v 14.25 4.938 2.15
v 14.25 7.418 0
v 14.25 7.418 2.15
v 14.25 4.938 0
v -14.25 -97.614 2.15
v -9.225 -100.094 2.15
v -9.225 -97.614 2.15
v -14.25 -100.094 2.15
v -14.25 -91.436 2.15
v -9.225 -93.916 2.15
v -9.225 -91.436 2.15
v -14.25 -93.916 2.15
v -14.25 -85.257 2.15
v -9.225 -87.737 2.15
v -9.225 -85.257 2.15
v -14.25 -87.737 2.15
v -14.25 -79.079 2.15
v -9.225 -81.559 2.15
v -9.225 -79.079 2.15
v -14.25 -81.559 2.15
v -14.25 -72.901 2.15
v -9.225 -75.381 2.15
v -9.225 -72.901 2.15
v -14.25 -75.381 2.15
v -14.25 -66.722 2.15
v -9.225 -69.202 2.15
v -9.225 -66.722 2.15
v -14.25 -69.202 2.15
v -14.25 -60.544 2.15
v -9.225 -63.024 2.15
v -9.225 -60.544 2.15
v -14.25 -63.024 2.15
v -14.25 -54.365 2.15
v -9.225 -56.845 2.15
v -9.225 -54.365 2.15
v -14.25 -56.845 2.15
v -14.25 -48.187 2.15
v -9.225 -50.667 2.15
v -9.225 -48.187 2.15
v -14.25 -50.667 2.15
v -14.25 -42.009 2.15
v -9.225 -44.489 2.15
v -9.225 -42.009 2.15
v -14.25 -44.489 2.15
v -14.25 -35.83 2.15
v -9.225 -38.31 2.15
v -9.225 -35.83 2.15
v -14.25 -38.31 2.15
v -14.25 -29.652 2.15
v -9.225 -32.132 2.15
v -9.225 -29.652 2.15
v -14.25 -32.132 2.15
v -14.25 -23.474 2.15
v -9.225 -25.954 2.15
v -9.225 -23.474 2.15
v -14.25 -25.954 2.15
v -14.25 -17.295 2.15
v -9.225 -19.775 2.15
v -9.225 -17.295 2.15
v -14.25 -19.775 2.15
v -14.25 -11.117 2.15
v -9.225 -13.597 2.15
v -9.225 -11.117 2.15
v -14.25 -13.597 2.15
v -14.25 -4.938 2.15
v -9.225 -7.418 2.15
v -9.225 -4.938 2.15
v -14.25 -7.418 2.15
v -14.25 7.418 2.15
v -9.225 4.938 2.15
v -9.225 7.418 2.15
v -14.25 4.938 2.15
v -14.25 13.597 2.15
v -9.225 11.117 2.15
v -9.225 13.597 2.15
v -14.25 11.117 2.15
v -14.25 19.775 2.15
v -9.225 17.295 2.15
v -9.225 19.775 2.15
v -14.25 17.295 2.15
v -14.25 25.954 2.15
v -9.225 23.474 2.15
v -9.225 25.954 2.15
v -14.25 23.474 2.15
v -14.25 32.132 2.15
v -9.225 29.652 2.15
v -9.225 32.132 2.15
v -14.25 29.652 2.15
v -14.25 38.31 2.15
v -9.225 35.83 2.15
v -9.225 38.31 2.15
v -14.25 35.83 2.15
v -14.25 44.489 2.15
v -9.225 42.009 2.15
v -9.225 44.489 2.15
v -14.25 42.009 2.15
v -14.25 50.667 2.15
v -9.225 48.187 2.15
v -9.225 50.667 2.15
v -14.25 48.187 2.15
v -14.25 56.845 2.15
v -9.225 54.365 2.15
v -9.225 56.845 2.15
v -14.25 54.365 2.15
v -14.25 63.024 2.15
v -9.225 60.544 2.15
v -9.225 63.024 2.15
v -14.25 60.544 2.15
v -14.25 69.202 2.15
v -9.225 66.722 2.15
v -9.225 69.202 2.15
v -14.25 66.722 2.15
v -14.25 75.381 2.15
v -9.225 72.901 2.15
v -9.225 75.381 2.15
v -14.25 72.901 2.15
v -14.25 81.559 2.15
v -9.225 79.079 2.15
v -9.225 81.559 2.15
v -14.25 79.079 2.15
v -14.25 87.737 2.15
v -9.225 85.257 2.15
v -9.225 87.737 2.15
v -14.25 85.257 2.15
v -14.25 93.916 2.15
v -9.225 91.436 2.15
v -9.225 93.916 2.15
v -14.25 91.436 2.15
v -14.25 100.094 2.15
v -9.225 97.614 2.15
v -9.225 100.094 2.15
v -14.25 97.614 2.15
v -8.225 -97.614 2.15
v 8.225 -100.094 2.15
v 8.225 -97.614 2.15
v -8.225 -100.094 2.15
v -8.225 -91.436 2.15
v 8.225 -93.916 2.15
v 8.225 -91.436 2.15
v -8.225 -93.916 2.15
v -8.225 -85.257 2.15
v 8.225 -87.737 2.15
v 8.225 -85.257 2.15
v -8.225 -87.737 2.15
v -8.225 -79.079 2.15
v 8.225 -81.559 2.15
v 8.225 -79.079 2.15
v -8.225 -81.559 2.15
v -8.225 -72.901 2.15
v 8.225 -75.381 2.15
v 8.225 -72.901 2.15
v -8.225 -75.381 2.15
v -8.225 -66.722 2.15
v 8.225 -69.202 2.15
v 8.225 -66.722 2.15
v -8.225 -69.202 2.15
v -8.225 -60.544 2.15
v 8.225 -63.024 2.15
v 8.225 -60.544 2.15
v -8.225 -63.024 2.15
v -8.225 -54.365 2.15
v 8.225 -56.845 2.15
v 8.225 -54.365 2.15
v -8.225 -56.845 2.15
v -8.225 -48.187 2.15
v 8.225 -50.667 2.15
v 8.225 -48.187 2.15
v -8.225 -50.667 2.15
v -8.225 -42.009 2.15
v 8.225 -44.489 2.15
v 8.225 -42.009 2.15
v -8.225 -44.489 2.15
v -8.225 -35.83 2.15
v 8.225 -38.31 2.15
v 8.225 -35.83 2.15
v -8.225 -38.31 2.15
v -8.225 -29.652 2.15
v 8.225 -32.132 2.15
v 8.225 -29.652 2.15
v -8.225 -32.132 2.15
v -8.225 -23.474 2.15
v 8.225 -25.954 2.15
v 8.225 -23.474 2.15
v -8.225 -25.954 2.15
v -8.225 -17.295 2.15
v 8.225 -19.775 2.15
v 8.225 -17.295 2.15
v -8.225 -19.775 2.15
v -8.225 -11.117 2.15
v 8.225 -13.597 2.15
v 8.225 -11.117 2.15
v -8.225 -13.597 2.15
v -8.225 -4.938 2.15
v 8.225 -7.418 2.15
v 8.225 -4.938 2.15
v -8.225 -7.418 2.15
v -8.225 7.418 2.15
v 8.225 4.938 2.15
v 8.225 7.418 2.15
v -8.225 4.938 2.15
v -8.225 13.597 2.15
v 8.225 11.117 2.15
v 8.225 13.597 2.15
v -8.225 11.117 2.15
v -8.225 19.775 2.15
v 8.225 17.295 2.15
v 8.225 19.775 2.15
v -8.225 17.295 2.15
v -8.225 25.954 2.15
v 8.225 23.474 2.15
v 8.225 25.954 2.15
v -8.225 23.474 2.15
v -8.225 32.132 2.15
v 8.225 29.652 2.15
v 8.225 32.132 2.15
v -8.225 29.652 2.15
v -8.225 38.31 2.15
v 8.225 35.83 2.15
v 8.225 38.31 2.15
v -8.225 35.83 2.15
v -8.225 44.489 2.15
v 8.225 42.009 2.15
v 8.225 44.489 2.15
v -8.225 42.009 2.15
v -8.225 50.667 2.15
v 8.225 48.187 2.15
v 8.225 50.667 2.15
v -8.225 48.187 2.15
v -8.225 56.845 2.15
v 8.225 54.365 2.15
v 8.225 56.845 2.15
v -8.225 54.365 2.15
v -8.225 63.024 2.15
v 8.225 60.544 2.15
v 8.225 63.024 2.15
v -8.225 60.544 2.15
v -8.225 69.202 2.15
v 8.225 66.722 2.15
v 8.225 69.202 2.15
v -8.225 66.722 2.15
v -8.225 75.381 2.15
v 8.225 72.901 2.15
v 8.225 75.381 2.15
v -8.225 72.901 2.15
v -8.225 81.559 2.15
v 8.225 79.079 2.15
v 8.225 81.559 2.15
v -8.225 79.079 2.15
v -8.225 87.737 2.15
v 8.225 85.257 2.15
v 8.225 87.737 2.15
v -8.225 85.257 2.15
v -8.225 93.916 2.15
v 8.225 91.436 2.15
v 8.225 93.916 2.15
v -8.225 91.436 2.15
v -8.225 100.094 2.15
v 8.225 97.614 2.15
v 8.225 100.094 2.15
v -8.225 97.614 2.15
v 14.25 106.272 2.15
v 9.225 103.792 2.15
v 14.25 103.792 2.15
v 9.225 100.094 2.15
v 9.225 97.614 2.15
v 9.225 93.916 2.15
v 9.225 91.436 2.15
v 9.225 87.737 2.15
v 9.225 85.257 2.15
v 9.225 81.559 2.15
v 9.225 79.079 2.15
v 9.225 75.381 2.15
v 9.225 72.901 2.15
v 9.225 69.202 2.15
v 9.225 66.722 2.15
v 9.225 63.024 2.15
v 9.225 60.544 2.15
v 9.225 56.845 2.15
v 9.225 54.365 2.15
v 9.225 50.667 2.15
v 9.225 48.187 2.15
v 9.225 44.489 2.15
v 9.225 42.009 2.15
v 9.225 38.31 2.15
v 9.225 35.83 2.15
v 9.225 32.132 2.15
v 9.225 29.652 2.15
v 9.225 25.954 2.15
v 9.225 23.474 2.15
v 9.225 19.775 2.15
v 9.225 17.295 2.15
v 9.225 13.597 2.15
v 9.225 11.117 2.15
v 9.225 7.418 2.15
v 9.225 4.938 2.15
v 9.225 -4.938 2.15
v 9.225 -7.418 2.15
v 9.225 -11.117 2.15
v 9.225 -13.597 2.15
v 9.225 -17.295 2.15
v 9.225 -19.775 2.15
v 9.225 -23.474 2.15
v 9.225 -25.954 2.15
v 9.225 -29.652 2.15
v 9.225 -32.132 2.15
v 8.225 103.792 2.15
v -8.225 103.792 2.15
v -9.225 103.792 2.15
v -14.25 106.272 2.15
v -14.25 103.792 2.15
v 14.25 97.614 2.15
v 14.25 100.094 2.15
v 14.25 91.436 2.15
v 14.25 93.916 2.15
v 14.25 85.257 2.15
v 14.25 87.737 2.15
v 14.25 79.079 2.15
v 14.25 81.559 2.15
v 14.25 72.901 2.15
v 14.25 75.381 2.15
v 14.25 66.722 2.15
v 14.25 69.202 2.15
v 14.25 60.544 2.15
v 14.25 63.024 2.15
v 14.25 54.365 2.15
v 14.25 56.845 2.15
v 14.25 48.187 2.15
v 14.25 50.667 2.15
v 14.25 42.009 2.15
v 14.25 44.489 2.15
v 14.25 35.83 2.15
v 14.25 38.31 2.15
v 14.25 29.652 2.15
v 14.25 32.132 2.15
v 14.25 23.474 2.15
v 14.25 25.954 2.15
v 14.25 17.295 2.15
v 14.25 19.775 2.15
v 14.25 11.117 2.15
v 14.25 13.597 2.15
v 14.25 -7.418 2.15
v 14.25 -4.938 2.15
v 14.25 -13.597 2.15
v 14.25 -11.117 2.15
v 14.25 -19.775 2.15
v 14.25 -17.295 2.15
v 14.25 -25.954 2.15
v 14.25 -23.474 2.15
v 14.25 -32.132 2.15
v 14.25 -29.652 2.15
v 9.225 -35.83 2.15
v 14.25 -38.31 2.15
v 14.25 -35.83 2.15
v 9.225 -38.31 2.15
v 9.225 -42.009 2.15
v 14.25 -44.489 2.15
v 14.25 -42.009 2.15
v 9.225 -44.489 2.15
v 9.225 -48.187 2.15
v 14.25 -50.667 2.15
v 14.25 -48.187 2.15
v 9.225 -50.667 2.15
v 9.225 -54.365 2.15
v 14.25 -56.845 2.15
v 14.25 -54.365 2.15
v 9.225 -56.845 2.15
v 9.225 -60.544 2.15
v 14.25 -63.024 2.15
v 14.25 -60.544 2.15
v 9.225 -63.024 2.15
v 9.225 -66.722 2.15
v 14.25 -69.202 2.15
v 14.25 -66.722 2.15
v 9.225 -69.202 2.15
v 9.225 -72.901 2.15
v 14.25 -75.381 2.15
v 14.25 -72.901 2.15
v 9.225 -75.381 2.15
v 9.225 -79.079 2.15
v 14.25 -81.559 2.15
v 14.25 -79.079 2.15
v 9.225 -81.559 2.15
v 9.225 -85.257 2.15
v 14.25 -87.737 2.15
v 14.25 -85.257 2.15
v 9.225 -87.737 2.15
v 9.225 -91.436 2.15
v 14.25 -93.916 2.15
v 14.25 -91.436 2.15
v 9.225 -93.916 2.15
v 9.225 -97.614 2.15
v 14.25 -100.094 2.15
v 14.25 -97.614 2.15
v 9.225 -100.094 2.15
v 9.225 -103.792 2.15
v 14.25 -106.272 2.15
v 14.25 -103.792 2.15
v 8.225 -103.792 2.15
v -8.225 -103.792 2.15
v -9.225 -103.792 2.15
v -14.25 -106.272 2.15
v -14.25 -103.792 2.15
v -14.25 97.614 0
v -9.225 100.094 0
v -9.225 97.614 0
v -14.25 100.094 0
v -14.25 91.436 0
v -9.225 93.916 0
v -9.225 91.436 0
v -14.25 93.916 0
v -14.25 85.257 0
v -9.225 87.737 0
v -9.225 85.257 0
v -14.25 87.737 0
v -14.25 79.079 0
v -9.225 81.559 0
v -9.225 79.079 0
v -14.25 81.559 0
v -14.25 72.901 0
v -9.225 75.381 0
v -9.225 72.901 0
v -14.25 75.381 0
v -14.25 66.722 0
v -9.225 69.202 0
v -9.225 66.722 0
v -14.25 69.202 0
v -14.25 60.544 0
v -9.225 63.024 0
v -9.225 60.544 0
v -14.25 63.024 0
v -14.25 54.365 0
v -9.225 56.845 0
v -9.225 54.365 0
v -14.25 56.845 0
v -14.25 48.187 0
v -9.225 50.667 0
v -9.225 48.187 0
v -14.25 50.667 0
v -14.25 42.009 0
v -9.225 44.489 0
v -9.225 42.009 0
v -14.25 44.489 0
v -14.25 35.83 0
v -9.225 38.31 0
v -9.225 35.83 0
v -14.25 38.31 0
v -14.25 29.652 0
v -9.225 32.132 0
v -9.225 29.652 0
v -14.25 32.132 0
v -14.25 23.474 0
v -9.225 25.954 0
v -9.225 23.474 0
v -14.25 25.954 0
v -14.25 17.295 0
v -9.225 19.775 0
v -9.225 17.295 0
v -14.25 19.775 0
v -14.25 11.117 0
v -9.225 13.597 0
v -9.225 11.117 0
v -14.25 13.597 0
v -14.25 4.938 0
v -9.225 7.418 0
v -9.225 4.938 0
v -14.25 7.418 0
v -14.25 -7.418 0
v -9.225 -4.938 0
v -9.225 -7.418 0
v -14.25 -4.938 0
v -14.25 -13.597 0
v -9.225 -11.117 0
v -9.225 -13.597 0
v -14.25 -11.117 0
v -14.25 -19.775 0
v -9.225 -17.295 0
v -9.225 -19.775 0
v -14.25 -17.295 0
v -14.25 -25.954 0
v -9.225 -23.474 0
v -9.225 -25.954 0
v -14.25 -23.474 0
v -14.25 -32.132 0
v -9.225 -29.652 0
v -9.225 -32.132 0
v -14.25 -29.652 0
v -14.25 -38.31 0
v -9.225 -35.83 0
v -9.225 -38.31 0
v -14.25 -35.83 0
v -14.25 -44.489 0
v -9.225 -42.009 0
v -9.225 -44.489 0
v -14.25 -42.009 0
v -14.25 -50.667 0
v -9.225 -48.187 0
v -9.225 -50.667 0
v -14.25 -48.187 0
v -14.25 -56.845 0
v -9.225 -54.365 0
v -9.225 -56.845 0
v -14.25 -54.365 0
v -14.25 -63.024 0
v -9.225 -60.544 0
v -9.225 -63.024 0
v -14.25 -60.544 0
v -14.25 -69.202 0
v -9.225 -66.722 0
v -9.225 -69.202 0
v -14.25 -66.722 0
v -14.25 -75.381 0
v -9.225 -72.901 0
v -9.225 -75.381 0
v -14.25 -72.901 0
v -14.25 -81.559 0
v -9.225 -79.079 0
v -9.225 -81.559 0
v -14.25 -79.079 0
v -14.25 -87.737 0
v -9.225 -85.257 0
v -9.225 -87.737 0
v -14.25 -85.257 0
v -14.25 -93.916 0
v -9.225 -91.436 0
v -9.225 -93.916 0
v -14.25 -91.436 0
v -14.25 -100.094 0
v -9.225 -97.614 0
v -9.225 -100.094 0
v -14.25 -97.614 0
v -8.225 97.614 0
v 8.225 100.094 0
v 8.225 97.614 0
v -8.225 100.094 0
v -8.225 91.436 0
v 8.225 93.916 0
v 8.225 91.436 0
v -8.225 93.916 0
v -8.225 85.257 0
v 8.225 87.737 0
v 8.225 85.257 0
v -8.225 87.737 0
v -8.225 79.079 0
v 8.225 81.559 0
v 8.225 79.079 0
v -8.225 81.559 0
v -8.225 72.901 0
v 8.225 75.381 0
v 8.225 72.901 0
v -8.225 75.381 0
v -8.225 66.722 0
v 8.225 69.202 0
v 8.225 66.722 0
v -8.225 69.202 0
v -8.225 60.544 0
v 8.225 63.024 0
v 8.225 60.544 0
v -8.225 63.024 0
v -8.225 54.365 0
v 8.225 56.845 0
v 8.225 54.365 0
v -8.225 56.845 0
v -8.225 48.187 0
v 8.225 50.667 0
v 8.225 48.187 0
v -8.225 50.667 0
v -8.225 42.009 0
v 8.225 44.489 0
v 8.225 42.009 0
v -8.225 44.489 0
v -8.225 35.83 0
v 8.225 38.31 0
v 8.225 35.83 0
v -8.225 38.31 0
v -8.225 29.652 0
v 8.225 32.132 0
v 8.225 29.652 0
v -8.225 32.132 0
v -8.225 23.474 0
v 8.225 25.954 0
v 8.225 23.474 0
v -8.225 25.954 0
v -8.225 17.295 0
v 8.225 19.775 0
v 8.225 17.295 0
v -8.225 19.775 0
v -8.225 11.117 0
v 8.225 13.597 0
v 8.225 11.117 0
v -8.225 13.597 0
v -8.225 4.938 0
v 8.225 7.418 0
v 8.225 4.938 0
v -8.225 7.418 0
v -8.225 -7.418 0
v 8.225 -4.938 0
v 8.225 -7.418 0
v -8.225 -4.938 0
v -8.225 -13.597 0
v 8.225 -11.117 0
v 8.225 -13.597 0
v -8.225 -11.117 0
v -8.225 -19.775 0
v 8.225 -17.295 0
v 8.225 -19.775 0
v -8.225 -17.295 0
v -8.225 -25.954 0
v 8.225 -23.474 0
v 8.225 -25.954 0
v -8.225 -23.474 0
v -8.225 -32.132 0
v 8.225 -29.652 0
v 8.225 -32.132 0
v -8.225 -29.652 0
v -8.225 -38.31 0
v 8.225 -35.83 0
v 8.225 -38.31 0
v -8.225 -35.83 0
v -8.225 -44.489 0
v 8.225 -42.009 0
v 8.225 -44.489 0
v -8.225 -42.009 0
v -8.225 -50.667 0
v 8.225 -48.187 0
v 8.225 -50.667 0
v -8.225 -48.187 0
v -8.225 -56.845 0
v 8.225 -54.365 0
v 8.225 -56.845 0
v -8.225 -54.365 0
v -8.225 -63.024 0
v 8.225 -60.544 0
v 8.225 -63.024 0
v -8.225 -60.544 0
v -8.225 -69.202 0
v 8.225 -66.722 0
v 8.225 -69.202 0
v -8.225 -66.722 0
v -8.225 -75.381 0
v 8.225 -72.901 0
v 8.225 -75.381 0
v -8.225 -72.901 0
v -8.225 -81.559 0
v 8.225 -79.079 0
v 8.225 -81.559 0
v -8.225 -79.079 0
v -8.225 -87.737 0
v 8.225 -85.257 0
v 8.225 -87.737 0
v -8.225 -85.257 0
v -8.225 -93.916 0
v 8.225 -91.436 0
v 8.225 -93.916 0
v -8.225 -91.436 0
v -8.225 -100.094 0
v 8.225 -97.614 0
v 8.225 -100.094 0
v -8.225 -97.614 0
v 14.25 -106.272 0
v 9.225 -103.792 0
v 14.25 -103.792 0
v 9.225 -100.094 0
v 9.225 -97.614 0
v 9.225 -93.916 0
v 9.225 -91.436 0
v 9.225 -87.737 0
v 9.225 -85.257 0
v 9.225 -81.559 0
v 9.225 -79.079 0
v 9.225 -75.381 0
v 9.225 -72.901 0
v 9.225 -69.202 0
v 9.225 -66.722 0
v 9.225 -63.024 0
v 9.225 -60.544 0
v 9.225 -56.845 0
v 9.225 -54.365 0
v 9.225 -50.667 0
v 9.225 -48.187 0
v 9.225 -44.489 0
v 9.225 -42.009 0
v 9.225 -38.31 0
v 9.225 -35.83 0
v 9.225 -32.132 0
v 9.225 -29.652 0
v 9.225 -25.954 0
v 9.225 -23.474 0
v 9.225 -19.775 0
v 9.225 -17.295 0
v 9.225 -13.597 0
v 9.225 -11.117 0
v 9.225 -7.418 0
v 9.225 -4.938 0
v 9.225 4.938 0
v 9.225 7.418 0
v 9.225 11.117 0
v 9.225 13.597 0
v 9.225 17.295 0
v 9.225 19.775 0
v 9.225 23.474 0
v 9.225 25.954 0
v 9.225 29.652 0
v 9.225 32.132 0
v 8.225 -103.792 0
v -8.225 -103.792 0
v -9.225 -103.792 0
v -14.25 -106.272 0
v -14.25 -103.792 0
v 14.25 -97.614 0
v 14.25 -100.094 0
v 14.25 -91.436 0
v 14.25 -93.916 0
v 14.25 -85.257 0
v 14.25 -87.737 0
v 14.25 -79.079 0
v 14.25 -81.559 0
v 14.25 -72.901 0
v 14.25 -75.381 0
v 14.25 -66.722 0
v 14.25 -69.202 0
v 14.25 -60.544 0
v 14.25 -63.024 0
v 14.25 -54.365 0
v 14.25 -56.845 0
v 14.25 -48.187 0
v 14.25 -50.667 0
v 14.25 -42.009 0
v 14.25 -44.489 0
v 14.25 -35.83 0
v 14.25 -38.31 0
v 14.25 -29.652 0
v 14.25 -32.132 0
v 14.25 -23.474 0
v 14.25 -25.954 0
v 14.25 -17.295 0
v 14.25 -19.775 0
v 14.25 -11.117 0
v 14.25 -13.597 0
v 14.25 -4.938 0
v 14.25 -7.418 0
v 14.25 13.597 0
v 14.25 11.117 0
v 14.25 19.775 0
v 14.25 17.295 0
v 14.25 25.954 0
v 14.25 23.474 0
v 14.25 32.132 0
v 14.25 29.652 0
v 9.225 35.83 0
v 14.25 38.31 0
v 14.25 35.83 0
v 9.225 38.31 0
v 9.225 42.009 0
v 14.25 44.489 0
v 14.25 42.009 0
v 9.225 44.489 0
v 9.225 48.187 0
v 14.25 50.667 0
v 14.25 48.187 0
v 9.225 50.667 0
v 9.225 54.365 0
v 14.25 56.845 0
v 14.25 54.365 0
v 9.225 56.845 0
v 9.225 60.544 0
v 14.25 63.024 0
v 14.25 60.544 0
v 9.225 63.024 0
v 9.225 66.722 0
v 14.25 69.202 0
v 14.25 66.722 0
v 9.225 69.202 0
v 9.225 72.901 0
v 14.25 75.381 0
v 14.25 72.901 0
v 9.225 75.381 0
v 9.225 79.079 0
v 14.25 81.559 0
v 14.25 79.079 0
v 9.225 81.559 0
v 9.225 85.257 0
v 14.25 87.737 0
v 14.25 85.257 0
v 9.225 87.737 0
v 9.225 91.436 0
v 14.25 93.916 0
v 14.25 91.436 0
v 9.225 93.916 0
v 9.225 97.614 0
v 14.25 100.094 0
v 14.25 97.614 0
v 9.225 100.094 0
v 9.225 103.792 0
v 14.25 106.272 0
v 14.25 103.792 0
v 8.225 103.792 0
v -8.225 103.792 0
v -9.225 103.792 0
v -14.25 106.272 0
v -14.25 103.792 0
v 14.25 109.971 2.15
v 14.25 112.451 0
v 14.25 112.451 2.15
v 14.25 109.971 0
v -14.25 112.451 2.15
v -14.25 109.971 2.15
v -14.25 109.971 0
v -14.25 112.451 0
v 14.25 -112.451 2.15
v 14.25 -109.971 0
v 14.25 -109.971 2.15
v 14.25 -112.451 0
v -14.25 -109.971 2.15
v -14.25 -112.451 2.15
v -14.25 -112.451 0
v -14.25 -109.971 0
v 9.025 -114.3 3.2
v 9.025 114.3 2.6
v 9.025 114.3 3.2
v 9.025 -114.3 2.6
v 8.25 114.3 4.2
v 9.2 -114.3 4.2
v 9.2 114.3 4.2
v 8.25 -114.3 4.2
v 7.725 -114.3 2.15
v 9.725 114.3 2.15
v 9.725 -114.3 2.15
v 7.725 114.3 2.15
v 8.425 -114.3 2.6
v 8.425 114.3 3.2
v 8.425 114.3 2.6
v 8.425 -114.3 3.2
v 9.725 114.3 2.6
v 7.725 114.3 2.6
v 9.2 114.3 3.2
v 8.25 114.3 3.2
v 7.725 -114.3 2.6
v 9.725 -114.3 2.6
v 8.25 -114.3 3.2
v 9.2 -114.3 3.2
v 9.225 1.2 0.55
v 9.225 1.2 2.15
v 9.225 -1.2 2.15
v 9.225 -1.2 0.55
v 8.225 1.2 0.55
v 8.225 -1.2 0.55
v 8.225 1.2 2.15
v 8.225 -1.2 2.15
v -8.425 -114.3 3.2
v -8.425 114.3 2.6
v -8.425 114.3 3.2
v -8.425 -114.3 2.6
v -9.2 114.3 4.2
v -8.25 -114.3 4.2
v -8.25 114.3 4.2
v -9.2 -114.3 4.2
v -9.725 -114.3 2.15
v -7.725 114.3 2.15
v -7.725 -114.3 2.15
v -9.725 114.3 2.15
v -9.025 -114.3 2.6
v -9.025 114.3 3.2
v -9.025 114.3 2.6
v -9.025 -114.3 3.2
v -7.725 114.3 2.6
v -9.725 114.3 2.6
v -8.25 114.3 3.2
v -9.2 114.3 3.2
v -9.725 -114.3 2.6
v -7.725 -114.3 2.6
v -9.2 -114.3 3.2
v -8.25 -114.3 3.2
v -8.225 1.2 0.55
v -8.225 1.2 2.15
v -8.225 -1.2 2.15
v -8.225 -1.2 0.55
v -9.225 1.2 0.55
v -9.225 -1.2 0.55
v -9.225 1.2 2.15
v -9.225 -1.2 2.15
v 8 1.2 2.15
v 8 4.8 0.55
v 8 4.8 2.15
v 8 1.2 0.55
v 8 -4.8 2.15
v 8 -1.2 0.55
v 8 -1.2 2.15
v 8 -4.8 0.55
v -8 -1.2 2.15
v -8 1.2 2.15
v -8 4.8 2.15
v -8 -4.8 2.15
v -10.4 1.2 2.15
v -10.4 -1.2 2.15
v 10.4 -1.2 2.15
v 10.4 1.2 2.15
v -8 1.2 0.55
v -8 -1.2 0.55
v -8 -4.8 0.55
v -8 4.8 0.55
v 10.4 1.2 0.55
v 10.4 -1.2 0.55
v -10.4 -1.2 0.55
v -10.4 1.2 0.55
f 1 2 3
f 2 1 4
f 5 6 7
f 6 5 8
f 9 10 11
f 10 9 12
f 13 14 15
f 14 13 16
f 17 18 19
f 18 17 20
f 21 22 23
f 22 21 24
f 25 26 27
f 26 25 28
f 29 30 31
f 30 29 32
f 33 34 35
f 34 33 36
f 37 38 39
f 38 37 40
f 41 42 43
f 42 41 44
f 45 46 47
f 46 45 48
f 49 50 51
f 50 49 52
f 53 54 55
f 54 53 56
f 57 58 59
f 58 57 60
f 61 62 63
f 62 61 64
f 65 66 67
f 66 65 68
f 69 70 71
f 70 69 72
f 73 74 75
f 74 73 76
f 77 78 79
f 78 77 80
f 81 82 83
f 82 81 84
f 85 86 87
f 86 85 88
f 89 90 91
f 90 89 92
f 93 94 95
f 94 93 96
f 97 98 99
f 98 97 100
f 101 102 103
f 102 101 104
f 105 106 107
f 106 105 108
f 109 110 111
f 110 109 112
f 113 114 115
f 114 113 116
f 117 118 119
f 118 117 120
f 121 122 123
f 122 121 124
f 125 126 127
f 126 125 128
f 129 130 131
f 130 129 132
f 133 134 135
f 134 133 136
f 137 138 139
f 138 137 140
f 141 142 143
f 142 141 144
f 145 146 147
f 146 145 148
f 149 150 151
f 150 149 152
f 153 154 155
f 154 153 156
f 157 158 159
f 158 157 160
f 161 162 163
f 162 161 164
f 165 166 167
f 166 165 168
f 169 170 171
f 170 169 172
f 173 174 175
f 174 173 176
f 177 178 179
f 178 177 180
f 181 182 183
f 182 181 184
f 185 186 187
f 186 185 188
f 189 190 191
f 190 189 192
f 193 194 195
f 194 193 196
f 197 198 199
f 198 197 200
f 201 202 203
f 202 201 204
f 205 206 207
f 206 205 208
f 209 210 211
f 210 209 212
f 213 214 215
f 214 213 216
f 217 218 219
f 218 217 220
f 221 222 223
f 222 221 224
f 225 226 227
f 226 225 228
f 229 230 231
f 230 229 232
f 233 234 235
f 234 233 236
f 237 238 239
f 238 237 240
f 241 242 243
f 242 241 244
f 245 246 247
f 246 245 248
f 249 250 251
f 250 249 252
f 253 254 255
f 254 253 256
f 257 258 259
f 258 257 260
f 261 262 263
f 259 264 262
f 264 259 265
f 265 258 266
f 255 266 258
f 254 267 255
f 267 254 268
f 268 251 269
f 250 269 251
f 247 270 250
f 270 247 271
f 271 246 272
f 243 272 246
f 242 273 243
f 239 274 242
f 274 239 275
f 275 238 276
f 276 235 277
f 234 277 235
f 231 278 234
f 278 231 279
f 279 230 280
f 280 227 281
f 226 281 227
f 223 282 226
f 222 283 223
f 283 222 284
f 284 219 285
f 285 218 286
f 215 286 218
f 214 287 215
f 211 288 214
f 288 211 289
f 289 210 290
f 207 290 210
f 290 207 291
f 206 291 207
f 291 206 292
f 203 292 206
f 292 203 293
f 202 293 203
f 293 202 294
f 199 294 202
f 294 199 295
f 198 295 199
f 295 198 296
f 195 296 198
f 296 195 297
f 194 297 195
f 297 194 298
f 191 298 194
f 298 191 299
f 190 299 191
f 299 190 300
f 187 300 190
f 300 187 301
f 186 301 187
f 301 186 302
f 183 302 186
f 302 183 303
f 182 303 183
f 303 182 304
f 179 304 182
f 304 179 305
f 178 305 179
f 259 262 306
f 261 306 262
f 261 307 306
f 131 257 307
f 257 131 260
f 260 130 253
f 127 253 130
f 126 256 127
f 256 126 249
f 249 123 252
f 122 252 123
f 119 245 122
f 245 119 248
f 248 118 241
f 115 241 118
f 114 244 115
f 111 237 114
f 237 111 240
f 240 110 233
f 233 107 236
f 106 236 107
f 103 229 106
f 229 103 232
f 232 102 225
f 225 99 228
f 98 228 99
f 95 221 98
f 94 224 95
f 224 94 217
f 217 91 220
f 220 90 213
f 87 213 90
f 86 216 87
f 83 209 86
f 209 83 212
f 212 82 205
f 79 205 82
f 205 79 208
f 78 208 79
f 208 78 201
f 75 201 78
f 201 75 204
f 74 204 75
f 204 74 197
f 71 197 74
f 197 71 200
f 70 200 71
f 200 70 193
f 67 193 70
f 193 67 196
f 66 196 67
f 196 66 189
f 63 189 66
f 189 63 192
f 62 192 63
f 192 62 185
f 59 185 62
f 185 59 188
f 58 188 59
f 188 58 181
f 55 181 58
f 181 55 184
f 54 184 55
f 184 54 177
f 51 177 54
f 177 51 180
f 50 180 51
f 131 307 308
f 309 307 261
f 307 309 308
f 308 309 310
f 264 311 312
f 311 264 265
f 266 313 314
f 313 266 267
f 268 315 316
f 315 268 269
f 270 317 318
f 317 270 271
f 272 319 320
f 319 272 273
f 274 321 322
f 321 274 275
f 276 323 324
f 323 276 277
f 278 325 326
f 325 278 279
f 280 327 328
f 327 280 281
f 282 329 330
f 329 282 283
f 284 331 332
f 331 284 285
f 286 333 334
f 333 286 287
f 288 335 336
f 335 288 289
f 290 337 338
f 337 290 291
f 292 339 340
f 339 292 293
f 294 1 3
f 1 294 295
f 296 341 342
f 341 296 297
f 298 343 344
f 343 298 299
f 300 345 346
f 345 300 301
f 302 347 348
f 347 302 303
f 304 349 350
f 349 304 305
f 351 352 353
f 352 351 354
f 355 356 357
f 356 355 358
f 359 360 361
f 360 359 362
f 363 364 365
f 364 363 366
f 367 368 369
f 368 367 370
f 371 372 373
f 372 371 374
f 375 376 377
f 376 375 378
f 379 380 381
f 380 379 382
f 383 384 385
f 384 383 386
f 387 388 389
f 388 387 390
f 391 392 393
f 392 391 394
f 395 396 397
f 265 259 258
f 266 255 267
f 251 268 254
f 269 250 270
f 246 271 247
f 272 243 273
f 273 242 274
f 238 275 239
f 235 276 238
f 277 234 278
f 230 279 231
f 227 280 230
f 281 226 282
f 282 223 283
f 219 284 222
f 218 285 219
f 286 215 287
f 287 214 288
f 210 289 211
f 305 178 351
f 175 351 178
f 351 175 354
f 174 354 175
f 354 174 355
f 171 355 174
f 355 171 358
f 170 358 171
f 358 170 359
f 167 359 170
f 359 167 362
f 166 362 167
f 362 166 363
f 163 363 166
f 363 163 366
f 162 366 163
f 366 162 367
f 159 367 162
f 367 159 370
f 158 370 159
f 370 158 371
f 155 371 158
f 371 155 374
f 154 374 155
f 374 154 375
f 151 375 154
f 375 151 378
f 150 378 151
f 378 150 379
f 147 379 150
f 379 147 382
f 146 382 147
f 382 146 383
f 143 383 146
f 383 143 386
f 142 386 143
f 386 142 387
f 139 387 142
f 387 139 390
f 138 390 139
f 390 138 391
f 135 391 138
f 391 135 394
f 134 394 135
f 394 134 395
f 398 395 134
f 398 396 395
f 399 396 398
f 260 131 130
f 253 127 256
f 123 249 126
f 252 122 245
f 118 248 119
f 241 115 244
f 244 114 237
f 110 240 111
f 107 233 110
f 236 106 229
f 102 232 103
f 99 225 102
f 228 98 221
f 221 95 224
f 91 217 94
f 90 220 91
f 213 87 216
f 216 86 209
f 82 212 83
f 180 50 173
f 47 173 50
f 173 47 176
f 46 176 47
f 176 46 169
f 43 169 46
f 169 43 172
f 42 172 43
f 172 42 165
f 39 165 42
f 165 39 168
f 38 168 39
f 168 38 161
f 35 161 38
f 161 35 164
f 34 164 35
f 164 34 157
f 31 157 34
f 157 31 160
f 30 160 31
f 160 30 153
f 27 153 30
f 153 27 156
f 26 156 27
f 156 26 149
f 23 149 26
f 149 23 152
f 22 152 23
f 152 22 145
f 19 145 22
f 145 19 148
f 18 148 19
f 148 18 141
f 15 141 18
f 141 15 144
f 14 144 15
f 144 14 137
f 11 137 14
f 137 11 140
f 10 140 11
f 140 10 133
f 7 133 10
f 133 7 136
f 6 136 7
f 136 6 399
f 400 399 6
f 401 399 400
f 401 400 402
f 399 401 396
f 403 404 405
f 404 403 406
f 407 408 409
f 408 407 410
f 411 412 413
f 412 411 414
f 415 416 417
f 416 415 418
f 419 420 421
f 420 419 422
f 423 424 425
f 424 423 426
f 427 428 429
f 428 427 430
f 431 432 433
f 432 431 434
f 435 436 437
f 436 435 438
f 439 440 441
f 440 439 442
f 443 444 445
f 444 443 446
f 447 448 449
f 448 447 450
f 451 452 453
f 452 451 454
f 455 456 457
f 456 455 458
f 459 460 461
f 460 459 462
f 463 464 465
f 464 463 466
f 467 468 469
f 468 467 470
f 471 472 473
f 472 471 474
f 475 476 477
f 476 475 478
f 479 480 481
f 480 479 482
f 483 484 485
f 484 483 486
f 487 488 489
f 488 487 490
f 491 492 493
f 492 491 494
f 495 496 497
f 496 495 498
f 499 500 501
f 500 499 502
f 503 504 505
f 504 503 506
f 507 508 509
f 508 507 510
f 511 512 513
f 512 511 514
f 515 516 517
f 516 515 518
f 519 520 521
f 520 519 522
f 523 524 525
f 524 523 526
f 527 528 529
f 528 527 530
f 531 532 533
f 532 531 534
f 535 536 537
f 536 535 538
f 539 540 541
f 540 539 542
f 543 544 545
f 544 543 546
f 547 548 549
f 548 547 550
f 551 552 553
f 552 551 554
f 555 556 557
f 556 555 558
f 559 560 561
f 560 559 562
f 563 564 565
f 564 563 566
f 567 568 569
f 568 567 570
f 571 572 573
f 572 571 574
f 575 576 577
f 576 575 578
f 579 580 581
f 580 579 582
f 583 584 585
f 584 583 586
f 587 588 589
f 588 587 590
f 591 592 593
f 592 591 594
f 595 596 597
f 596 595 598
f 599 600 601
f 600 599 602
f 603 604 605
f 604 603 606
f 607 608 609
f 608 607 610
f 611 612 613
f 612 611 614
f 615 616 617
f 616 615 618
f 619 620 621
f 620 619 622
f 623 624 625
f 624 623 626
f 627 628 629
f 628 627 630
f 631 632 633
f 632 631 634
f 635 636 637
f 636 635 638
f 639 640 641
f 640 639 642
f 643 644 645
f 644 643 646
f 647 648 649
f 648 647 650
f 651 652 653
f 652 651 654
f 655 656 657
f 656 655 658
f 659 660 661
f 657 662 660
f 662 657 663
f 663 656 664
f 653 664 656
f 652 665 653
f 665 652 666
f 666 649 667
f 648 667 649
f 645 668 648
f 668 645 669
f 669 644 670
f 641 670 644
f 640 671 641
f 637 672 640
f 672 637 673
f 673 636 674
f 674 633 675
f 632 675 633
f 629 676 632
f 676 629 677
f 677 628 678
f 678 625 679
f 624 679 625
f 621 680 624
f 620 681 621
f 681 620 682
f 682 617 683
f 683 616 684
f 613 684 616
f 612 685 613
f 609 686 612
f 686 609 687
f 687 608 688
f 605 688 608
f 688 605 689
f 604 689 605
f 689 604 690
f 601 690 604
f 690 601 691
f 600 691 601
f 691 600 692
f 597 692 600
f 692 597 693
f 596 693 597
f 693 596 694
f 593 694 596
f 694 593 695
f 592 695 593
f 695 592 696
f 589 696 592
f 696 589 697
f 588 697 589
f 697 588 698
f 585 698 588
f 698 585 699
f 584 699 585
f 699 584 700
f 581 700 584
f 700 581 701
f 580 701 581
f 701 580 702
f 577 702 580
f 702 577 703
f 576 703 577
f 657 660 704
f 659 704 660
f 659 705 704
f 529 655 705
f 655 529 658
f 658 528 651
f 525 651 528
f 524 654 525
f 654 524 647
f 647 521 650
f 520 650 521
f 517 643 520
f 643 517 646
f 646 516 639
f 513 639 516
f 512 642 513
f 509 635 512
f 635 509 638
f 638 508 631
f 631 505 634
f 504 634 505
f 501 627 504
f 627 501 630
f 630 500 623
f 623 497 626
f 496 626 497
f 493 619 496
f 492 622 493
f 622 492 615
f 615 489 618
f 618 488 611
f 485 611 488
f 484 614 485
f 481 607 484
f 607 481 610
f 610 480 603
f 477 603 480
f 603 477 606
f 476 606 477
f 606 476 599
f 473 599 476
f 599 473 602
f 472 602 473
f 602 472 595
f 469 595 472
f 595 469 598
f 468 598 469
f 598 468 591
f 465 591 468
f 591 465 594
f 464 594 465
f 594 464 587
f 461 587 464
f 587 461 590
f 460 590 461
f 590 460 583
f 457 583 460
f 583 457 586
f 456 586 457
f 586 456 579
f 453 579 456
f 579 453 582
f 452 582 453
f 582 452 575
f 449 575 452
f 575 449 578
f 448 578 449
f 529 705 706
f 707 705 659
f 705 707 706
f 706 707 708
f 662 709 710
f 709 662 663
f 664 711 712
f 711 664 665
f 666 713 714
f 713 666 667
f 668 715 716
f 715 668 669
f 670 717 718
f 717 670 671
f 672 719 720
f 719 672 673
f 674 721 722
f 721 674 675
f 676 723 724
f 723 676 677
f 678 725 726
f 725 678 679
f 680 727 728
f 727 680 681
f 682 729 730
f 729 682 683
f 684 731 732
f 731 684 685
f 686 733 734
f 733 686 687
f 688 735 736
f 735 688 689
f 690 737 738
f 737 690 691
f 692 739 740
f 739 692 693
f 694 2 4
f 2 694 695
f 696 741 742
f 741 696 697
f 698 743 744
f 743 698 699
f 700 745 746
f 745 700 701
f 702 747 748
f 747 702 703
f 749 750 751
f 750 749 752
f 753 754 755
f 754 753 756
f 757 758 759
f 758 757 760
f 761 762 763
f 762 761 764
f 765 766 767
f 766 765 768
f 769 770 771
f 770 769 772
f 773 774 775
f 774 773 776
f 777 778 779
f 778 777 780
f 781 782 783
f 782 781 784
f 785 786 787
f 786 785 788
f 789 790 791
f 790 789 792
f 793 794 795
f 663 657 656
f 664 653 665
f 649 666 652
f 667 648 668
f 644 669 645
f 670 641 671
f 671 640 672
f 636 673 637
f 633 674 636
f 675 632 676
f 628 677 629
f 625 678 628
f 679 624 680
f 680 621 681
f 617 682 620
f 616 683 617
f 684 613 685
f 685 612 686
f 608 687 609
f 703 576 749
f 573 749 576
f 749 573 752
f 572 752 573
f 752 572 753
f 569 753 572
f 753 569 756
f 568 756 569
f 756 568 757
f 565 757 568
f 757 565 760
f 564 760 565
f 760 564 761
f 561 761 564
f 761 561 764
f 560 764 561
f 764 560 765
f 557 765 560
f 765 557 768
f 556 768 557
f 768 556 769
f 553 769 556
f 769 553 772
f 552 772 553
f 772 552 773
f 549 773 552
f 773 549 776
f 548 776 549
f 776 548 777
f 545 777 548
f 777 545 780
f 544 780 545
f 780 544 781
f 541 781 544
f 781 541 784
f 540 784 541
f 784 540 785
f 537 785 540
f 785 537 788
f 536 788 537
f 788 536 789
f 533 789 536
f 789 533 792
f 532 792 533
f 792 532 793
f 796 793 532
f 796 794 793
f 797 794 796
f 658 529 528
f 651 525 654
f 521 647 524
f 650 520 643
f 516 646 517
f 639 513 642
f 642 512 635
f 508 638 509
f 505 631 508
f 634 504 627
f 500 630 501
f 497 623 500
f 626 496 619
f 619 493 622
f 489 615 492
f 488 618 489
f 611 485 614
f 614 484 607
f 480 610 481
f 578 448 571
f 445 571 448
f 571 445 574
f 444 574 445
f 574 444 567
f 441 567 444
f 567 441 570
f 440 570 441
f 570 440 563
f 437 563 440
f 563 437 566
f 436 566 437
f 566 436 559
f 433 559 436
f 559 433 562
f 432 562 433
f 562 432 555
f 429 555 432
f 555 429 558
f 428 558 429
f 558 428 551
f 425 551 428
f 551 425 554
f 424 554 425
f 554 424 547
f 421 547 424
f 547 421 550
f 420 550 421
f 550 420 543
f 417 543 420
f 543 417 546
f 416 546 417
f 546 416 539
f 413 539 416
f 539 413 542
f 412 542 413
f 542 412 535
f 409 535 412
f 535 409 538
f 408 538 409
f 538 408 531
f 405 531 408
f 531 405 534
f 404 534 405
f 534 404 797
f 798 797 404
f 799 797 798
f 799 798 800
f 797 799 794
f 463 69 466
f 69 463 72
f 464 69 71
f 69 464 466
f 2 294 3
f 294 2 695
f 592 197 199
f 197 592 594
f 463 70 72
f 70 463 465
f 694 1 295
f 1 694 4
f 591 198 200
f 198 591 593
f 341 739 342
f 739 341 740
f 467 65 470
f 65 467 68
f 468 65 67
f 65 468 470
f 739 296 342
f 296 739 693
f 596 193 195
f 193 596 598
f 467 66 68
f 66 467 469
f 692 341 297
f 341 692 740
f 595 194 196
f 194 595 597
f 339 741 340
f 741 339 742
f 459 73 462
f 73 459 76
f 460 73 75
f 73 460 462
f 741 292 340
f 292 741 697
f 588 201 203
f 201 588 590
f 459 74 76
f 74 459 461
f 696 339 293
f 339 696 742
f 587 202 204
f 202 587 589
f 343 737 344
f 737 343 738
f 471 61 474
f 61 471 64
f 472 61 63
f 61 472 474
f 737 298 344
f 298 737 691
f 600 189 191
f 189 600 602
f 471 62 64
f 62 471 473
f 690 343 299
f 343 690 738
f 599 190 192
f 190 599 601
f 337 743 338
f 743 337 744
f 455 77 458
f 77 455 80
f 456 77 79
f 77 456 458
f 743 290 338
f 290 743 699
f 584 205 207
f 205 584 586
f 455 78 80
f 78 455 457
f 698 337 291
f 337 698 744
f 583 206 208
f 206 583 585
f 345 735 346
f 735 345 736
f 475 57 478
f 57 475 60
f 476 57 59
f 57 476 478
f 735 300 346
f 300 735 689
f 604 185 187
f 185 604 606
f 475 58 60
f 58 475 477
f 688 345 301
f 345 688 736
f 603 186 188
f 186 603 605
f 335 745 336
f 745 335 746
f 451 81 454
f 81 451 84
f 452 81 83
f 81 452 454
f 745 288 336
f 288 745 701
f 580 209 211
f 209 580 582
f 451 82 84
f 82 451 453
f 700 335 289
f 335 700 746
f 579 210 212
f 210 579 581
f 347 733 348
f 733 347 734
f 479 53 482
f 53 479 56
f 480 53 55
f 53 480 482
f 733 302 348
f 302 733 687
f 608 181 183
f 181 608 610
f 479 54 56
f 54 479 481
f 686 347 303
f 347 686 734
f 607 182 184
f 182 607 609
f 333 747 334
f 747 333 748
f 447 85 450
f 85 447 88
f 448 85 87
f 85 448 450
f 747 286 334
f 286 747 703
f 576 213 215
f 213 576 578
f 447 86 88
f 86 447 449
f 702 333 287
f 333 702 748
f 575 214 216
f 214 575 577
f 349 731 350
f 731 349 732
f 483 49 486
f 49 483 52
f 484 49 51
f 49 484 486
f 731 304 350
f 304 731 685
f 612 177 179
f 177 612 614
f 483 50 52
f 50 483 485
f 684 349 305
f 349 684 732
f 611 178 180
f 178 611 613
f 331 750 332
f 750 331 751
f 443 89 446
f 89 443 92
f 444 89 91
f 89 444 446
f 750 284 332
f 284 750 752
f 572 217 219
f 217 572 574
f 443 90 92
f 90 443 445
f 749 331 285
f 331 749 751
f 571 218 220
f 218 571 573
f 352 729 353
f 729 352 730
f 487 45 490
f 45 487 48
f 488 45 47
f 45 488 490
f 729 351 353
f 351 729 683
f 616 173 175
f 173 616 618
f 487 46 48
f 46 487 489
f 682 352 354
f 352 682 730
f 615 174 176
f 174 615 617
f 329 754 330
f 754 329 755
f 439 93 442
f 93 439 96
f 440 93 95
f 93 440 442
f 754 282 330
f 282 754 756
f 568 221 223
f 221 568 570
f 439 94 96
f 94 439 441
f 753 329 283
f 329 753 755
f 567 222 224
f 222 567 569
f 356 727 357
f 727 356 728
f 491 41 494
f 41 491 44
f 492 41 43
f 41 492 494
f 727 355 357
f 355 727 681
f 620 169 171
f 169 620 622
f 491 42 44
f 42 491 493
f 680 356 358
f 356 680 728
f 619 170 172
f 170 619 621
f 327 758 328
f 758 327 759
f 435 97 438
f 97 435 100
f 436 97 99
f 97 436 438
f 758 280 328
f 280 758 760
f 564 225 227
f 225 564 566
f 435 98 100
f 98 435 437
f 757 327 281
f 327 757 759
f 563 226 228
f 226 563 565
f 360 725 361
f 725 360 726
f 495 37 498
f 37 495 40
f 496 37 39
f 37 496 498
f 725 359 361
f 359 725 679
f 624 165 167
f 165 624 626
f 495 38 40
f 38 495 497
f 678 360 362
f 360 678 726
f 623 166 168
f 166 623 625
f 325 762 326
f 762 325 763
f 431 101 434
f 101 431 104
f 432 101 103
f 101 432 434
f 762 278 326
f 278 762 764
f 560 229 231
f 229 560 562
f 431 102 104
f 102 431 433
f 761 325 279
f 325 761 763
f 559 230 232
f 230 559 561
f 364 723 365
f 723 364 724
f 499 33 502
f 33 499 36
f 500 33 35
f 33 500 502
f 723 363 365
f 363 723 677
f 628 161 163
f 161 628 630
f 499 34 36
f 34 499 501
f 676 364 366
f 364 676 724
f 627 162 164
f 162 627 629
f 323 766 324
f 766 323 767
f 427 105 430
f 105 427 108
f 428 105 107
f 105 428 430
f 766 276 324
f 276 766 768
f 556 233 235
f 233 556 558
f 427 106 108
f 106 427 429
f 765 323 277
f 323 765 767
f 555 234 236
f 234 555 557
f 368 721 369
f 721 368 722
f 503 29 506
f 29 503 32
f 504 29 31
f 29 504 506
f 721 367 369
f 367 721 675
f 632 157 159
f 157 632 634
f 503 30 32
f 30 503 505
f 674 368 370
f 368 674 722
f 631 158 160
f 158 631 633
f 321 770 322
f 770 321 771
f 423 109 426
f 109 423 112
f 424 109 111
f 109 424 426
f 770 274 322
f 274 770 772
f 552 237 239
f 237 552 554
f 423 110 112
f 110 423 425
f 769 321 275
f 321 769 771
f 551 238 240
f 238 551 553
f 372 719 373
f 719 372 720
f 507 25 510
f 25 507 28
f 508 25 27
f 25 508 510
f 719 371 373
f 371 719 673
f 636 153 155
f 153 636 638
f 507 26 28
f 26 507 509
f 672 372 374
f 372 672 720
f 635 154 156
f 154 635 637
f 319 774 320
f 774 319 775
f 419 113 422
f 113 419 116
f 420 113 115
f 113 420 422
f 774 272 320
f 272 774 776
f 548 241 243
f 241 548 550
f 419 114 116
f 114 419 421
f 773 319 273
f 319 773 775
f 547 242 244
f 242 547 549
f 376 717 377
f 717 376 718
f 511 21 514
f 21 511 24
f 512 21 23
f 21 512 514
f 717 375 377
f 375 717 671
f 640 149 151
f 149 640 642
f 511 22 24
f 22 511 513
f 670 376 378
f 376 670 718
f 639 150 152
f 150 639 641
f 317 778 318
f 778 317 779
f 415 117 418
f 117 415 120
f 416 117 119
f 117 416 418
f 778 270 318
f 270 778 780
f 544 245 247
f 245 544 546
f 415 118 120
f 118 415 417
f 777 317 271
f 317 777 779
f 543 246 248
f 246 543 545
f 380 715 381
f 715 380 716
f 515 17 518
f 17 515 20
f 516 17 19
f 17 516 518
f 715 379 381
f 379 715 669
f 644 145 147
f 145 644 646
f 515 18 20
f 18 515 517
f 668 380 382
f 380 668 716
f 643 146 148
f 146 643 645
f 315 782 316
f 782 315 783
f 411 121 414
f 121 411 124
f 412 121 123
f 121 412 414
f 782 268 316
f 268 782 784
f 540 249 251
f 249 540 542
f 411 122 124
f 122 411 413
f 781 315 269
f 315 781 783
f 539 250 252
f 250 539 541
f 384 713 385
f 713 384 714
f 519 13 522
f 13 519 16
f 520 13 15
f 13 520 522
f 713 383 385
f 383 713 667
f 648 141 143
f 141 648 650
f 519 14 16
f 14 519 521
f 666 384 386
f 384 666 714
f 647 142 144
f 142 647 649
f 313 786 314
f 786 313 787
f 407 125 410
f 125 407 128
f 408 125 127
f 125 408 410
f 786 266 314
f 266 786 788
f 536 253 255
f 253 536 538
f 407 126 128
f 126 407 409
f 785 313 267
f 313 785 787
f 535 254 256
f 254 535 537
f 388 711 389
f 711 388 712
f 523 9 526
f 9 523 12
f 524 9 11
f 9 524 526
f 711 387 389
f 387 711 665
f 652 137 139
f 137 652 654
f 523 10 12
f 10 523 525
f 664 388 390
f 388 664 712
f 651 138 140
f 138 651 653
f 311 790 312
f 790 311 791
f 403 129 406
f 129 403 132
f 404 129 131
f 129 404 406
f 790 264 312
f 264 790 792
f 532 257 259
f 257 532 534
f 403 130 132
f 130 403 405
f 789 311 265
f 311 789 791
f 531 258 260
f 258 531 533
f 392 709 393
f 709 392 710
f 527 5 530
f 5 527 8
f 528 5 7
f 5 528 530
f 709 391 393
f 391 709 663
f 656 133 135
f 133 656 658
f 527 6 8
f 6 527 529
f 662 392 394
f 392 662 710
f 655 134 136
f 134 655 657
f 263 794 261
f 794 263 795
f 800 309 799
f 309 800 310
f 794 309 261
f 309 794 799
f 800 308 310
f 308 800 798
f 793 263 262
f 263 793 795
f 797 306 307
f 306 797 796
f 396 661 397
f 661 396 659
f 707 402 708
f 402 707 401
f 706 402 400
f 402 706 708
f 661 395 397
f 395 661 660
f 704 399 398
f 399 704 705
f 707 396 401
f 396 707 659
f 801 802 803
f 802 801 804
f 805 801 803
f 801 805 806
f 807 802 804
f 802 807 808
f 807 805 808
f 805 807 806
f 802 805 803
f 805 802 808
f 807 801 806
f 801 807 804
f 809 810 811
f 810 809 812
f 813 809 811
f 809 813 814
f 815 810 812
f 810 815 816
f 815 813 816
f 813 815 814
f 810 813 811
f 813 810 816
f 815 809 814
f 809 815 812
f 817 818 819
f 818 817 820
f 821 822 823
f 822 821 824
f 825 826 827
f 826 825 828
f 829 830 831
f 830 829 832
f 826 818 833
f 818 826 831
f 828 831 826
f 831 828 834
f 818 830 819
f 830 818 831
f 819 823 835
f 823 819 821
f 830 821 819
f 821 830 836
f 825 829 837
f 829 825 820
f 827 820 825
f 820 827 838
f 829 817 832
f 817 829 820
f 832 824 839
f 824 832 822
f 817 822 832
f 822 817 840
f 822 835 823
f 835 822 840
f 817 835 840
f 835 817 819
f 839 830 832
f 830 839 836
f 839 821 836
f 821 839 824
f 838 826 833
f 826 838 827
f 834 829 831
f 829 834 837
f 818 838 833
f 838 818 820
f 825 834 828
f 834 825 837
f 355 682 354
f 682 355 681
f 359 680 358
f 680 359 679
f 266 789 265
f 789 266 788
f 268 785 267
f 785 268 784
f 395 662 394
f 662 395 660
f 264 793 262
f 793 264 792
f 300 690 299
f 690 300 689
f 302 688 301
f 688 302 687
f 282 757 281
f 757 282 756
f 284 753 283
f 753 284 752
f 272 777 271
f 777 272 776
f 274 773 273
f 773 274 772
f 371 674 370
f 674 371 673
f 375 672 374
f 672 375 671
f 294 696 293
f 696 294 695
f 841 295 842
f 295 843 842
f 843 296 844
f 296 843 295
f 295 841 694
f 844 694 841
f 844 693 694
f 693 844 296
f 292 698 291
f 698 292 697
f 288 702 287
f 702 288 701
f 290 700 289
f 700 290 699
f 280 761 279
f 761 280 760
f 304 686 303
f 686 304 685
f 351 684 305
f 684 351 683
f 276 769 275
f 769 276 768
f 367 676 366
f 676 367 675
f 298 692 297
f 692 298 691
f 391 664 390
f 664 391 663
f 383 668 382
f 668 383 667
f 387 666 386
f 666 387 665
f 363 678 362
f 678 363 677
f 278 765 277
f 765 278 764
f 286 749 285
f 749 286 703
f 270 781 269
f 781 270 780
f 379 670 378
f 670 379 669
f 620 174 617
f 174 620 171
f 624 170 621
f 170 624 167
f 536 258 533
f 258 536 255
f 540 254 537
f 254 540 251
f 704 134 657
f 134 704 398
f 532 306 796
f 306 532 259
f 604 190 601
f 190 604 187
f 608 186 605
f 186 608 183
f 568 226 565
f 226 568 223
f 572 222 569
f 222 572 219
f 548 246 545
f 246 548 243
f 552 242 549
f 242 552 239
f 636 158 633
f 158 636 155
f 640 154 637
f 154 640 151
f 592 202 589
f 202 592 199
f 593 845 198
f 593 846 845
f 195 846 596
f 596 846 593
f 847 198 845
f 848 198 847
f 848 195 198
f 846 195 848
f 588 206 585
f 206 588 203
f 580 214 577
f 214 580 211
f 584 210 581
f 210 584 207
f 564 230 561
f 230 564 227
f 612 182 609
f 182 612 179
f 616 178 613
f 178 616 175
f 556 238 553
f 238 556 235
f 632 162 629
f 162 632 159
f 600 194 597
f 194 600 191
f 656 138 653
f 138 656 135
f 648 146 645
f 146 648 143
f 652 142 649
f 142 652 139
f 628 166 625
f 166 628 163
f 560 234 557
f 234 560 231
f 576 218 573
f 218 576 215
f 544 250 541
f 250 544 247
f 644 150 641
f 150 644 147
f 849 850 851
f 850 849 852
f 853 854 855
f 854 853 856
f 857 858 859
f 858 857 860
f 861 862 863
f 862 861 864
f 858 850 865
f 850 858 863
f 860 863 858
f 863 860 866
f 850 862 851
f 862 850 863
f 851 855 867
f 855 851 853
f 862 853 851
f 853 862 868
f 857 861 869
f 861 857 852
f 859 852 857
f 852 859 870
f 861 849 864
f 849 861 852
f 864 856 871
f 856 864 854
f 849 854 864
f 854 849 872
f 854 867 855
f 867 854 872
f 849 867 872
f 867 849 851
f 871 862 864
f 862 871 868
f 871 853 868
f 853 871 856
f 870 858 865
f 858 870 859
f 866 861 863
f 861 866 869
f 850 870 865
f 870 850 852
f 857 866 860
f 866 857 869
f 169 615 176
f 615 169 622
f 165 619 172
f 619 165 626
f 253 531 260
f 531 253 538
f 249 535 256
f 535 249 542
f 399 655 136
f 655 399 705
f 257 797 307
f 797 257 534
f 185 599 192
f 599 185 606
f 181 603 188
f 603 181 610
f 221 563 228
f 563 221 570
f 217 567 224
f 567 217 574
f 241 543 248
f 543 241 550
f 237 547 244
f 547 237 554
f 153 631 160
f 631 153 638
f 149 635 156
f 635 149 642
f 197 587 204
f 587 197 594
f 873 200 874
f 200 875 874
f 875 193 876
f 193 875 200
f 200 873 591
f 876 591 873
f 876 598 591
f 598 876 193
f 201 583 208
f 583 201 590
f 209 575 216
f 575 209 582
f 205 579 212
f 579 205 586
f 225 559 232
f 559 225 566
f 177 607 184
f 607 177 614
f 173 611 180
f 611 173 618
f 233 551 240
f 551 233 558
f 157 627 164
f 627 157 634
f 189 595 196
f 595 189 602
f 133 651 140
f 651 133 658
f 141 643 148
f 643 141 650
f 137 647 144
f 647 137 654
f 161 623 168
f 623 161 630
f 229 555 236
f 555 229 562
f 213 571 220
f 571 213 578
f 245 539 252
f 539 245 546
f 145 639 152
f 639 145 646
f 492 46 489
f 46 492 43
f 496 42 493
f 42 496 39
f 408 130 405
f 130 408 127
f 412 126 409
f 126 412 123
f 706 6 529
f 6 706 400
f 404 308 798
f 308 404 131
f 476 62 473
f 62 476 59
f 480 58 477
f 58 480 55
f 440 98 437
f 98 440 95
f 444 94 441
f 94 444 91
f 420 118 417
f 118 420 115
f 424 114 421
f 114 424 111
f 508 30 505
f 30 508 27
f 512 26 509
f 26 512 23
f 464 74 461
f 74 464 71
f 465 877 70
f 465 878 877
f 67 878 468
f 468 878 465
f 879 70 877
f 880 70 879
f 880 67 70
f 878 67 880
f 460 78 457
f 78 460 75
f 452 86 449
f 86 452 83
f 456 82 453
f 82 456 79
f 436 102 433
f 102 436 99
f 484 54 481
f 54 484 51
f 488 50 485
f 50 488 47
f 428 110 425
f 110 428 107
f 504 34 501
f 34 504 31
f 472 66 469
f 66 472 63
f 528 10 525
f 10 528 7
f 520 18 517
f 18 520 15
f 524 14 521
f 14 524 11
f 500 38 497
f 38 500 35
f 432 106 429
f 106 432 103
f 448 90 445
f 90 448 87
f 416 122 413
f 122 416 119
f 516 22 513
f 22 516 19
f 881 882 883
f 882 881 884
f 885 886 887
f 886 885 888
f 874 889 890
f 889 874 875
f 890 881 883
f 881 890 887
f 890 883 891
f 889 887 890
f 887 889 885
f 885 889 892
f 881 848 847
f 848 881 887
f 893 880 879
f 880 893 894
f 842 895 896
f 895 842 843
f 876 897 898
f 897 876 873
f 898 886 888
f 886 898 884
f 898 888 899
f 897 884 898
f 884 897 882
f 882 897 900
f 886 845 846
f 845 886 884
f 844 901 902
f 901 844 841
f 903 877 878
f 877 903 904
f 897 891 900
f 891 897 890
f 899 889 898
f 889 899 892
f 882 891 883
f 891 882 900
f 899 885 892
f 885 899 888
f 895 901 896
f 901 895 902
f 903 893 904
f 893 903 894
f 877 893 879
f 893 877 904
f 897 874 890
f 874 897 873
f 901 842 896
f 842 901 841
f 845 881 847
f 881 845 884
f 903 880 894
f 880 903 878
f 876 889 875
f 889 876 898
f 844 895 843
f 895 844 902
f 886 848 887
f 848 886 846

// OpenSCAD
LENGTH  = 228.6;
TIE     = 2.48;
BETWEEN = LENGTH / 37; // 3.7
// 19.8, 15.8

module tie() {
  color("saddlebrown")
  cube([28.5, TIE, 2.15], true);
}
module rail() {
  color("saddlebrown")
  cube([1, LENGTH + TIE - BETWEEN * 3, 2.15], true);

  color("goldenrod")
  translate([0, 0, 2.1])
  union() {
    cube([0.6, LENGTH, 2.05], true);
    translate([0, 0, 0.525])
    cube([0.95, LENGTH, 1], true);
    translate([0, 0, -0.8])
    cube([2, LENGTH, 0.45], true);
  }
}
module track() {
  translate([0, 0, 2.15/2]) {
    //tie();
    for (i = [1:18]) {
      translate([0, i*BETWEEN, 0])
      tie();
      translate([0, -i*BETWEEN, 0])
      tie();
    }

    translate([8.725, 0, 0]) {
      rail();
    }
    translate([-8.725, 0, 0]) {
      rail();
    }
  }
}
// Rev 1.0
module beacon() {
  color("darkslategray")
  translate([0, 0, 0.8 + 0.55])
  union() {
    cube([16, 9.6, 1.6], true);
    cube([20.8, 2.4, 1.6], true);
  }
}

track();
beacon();
